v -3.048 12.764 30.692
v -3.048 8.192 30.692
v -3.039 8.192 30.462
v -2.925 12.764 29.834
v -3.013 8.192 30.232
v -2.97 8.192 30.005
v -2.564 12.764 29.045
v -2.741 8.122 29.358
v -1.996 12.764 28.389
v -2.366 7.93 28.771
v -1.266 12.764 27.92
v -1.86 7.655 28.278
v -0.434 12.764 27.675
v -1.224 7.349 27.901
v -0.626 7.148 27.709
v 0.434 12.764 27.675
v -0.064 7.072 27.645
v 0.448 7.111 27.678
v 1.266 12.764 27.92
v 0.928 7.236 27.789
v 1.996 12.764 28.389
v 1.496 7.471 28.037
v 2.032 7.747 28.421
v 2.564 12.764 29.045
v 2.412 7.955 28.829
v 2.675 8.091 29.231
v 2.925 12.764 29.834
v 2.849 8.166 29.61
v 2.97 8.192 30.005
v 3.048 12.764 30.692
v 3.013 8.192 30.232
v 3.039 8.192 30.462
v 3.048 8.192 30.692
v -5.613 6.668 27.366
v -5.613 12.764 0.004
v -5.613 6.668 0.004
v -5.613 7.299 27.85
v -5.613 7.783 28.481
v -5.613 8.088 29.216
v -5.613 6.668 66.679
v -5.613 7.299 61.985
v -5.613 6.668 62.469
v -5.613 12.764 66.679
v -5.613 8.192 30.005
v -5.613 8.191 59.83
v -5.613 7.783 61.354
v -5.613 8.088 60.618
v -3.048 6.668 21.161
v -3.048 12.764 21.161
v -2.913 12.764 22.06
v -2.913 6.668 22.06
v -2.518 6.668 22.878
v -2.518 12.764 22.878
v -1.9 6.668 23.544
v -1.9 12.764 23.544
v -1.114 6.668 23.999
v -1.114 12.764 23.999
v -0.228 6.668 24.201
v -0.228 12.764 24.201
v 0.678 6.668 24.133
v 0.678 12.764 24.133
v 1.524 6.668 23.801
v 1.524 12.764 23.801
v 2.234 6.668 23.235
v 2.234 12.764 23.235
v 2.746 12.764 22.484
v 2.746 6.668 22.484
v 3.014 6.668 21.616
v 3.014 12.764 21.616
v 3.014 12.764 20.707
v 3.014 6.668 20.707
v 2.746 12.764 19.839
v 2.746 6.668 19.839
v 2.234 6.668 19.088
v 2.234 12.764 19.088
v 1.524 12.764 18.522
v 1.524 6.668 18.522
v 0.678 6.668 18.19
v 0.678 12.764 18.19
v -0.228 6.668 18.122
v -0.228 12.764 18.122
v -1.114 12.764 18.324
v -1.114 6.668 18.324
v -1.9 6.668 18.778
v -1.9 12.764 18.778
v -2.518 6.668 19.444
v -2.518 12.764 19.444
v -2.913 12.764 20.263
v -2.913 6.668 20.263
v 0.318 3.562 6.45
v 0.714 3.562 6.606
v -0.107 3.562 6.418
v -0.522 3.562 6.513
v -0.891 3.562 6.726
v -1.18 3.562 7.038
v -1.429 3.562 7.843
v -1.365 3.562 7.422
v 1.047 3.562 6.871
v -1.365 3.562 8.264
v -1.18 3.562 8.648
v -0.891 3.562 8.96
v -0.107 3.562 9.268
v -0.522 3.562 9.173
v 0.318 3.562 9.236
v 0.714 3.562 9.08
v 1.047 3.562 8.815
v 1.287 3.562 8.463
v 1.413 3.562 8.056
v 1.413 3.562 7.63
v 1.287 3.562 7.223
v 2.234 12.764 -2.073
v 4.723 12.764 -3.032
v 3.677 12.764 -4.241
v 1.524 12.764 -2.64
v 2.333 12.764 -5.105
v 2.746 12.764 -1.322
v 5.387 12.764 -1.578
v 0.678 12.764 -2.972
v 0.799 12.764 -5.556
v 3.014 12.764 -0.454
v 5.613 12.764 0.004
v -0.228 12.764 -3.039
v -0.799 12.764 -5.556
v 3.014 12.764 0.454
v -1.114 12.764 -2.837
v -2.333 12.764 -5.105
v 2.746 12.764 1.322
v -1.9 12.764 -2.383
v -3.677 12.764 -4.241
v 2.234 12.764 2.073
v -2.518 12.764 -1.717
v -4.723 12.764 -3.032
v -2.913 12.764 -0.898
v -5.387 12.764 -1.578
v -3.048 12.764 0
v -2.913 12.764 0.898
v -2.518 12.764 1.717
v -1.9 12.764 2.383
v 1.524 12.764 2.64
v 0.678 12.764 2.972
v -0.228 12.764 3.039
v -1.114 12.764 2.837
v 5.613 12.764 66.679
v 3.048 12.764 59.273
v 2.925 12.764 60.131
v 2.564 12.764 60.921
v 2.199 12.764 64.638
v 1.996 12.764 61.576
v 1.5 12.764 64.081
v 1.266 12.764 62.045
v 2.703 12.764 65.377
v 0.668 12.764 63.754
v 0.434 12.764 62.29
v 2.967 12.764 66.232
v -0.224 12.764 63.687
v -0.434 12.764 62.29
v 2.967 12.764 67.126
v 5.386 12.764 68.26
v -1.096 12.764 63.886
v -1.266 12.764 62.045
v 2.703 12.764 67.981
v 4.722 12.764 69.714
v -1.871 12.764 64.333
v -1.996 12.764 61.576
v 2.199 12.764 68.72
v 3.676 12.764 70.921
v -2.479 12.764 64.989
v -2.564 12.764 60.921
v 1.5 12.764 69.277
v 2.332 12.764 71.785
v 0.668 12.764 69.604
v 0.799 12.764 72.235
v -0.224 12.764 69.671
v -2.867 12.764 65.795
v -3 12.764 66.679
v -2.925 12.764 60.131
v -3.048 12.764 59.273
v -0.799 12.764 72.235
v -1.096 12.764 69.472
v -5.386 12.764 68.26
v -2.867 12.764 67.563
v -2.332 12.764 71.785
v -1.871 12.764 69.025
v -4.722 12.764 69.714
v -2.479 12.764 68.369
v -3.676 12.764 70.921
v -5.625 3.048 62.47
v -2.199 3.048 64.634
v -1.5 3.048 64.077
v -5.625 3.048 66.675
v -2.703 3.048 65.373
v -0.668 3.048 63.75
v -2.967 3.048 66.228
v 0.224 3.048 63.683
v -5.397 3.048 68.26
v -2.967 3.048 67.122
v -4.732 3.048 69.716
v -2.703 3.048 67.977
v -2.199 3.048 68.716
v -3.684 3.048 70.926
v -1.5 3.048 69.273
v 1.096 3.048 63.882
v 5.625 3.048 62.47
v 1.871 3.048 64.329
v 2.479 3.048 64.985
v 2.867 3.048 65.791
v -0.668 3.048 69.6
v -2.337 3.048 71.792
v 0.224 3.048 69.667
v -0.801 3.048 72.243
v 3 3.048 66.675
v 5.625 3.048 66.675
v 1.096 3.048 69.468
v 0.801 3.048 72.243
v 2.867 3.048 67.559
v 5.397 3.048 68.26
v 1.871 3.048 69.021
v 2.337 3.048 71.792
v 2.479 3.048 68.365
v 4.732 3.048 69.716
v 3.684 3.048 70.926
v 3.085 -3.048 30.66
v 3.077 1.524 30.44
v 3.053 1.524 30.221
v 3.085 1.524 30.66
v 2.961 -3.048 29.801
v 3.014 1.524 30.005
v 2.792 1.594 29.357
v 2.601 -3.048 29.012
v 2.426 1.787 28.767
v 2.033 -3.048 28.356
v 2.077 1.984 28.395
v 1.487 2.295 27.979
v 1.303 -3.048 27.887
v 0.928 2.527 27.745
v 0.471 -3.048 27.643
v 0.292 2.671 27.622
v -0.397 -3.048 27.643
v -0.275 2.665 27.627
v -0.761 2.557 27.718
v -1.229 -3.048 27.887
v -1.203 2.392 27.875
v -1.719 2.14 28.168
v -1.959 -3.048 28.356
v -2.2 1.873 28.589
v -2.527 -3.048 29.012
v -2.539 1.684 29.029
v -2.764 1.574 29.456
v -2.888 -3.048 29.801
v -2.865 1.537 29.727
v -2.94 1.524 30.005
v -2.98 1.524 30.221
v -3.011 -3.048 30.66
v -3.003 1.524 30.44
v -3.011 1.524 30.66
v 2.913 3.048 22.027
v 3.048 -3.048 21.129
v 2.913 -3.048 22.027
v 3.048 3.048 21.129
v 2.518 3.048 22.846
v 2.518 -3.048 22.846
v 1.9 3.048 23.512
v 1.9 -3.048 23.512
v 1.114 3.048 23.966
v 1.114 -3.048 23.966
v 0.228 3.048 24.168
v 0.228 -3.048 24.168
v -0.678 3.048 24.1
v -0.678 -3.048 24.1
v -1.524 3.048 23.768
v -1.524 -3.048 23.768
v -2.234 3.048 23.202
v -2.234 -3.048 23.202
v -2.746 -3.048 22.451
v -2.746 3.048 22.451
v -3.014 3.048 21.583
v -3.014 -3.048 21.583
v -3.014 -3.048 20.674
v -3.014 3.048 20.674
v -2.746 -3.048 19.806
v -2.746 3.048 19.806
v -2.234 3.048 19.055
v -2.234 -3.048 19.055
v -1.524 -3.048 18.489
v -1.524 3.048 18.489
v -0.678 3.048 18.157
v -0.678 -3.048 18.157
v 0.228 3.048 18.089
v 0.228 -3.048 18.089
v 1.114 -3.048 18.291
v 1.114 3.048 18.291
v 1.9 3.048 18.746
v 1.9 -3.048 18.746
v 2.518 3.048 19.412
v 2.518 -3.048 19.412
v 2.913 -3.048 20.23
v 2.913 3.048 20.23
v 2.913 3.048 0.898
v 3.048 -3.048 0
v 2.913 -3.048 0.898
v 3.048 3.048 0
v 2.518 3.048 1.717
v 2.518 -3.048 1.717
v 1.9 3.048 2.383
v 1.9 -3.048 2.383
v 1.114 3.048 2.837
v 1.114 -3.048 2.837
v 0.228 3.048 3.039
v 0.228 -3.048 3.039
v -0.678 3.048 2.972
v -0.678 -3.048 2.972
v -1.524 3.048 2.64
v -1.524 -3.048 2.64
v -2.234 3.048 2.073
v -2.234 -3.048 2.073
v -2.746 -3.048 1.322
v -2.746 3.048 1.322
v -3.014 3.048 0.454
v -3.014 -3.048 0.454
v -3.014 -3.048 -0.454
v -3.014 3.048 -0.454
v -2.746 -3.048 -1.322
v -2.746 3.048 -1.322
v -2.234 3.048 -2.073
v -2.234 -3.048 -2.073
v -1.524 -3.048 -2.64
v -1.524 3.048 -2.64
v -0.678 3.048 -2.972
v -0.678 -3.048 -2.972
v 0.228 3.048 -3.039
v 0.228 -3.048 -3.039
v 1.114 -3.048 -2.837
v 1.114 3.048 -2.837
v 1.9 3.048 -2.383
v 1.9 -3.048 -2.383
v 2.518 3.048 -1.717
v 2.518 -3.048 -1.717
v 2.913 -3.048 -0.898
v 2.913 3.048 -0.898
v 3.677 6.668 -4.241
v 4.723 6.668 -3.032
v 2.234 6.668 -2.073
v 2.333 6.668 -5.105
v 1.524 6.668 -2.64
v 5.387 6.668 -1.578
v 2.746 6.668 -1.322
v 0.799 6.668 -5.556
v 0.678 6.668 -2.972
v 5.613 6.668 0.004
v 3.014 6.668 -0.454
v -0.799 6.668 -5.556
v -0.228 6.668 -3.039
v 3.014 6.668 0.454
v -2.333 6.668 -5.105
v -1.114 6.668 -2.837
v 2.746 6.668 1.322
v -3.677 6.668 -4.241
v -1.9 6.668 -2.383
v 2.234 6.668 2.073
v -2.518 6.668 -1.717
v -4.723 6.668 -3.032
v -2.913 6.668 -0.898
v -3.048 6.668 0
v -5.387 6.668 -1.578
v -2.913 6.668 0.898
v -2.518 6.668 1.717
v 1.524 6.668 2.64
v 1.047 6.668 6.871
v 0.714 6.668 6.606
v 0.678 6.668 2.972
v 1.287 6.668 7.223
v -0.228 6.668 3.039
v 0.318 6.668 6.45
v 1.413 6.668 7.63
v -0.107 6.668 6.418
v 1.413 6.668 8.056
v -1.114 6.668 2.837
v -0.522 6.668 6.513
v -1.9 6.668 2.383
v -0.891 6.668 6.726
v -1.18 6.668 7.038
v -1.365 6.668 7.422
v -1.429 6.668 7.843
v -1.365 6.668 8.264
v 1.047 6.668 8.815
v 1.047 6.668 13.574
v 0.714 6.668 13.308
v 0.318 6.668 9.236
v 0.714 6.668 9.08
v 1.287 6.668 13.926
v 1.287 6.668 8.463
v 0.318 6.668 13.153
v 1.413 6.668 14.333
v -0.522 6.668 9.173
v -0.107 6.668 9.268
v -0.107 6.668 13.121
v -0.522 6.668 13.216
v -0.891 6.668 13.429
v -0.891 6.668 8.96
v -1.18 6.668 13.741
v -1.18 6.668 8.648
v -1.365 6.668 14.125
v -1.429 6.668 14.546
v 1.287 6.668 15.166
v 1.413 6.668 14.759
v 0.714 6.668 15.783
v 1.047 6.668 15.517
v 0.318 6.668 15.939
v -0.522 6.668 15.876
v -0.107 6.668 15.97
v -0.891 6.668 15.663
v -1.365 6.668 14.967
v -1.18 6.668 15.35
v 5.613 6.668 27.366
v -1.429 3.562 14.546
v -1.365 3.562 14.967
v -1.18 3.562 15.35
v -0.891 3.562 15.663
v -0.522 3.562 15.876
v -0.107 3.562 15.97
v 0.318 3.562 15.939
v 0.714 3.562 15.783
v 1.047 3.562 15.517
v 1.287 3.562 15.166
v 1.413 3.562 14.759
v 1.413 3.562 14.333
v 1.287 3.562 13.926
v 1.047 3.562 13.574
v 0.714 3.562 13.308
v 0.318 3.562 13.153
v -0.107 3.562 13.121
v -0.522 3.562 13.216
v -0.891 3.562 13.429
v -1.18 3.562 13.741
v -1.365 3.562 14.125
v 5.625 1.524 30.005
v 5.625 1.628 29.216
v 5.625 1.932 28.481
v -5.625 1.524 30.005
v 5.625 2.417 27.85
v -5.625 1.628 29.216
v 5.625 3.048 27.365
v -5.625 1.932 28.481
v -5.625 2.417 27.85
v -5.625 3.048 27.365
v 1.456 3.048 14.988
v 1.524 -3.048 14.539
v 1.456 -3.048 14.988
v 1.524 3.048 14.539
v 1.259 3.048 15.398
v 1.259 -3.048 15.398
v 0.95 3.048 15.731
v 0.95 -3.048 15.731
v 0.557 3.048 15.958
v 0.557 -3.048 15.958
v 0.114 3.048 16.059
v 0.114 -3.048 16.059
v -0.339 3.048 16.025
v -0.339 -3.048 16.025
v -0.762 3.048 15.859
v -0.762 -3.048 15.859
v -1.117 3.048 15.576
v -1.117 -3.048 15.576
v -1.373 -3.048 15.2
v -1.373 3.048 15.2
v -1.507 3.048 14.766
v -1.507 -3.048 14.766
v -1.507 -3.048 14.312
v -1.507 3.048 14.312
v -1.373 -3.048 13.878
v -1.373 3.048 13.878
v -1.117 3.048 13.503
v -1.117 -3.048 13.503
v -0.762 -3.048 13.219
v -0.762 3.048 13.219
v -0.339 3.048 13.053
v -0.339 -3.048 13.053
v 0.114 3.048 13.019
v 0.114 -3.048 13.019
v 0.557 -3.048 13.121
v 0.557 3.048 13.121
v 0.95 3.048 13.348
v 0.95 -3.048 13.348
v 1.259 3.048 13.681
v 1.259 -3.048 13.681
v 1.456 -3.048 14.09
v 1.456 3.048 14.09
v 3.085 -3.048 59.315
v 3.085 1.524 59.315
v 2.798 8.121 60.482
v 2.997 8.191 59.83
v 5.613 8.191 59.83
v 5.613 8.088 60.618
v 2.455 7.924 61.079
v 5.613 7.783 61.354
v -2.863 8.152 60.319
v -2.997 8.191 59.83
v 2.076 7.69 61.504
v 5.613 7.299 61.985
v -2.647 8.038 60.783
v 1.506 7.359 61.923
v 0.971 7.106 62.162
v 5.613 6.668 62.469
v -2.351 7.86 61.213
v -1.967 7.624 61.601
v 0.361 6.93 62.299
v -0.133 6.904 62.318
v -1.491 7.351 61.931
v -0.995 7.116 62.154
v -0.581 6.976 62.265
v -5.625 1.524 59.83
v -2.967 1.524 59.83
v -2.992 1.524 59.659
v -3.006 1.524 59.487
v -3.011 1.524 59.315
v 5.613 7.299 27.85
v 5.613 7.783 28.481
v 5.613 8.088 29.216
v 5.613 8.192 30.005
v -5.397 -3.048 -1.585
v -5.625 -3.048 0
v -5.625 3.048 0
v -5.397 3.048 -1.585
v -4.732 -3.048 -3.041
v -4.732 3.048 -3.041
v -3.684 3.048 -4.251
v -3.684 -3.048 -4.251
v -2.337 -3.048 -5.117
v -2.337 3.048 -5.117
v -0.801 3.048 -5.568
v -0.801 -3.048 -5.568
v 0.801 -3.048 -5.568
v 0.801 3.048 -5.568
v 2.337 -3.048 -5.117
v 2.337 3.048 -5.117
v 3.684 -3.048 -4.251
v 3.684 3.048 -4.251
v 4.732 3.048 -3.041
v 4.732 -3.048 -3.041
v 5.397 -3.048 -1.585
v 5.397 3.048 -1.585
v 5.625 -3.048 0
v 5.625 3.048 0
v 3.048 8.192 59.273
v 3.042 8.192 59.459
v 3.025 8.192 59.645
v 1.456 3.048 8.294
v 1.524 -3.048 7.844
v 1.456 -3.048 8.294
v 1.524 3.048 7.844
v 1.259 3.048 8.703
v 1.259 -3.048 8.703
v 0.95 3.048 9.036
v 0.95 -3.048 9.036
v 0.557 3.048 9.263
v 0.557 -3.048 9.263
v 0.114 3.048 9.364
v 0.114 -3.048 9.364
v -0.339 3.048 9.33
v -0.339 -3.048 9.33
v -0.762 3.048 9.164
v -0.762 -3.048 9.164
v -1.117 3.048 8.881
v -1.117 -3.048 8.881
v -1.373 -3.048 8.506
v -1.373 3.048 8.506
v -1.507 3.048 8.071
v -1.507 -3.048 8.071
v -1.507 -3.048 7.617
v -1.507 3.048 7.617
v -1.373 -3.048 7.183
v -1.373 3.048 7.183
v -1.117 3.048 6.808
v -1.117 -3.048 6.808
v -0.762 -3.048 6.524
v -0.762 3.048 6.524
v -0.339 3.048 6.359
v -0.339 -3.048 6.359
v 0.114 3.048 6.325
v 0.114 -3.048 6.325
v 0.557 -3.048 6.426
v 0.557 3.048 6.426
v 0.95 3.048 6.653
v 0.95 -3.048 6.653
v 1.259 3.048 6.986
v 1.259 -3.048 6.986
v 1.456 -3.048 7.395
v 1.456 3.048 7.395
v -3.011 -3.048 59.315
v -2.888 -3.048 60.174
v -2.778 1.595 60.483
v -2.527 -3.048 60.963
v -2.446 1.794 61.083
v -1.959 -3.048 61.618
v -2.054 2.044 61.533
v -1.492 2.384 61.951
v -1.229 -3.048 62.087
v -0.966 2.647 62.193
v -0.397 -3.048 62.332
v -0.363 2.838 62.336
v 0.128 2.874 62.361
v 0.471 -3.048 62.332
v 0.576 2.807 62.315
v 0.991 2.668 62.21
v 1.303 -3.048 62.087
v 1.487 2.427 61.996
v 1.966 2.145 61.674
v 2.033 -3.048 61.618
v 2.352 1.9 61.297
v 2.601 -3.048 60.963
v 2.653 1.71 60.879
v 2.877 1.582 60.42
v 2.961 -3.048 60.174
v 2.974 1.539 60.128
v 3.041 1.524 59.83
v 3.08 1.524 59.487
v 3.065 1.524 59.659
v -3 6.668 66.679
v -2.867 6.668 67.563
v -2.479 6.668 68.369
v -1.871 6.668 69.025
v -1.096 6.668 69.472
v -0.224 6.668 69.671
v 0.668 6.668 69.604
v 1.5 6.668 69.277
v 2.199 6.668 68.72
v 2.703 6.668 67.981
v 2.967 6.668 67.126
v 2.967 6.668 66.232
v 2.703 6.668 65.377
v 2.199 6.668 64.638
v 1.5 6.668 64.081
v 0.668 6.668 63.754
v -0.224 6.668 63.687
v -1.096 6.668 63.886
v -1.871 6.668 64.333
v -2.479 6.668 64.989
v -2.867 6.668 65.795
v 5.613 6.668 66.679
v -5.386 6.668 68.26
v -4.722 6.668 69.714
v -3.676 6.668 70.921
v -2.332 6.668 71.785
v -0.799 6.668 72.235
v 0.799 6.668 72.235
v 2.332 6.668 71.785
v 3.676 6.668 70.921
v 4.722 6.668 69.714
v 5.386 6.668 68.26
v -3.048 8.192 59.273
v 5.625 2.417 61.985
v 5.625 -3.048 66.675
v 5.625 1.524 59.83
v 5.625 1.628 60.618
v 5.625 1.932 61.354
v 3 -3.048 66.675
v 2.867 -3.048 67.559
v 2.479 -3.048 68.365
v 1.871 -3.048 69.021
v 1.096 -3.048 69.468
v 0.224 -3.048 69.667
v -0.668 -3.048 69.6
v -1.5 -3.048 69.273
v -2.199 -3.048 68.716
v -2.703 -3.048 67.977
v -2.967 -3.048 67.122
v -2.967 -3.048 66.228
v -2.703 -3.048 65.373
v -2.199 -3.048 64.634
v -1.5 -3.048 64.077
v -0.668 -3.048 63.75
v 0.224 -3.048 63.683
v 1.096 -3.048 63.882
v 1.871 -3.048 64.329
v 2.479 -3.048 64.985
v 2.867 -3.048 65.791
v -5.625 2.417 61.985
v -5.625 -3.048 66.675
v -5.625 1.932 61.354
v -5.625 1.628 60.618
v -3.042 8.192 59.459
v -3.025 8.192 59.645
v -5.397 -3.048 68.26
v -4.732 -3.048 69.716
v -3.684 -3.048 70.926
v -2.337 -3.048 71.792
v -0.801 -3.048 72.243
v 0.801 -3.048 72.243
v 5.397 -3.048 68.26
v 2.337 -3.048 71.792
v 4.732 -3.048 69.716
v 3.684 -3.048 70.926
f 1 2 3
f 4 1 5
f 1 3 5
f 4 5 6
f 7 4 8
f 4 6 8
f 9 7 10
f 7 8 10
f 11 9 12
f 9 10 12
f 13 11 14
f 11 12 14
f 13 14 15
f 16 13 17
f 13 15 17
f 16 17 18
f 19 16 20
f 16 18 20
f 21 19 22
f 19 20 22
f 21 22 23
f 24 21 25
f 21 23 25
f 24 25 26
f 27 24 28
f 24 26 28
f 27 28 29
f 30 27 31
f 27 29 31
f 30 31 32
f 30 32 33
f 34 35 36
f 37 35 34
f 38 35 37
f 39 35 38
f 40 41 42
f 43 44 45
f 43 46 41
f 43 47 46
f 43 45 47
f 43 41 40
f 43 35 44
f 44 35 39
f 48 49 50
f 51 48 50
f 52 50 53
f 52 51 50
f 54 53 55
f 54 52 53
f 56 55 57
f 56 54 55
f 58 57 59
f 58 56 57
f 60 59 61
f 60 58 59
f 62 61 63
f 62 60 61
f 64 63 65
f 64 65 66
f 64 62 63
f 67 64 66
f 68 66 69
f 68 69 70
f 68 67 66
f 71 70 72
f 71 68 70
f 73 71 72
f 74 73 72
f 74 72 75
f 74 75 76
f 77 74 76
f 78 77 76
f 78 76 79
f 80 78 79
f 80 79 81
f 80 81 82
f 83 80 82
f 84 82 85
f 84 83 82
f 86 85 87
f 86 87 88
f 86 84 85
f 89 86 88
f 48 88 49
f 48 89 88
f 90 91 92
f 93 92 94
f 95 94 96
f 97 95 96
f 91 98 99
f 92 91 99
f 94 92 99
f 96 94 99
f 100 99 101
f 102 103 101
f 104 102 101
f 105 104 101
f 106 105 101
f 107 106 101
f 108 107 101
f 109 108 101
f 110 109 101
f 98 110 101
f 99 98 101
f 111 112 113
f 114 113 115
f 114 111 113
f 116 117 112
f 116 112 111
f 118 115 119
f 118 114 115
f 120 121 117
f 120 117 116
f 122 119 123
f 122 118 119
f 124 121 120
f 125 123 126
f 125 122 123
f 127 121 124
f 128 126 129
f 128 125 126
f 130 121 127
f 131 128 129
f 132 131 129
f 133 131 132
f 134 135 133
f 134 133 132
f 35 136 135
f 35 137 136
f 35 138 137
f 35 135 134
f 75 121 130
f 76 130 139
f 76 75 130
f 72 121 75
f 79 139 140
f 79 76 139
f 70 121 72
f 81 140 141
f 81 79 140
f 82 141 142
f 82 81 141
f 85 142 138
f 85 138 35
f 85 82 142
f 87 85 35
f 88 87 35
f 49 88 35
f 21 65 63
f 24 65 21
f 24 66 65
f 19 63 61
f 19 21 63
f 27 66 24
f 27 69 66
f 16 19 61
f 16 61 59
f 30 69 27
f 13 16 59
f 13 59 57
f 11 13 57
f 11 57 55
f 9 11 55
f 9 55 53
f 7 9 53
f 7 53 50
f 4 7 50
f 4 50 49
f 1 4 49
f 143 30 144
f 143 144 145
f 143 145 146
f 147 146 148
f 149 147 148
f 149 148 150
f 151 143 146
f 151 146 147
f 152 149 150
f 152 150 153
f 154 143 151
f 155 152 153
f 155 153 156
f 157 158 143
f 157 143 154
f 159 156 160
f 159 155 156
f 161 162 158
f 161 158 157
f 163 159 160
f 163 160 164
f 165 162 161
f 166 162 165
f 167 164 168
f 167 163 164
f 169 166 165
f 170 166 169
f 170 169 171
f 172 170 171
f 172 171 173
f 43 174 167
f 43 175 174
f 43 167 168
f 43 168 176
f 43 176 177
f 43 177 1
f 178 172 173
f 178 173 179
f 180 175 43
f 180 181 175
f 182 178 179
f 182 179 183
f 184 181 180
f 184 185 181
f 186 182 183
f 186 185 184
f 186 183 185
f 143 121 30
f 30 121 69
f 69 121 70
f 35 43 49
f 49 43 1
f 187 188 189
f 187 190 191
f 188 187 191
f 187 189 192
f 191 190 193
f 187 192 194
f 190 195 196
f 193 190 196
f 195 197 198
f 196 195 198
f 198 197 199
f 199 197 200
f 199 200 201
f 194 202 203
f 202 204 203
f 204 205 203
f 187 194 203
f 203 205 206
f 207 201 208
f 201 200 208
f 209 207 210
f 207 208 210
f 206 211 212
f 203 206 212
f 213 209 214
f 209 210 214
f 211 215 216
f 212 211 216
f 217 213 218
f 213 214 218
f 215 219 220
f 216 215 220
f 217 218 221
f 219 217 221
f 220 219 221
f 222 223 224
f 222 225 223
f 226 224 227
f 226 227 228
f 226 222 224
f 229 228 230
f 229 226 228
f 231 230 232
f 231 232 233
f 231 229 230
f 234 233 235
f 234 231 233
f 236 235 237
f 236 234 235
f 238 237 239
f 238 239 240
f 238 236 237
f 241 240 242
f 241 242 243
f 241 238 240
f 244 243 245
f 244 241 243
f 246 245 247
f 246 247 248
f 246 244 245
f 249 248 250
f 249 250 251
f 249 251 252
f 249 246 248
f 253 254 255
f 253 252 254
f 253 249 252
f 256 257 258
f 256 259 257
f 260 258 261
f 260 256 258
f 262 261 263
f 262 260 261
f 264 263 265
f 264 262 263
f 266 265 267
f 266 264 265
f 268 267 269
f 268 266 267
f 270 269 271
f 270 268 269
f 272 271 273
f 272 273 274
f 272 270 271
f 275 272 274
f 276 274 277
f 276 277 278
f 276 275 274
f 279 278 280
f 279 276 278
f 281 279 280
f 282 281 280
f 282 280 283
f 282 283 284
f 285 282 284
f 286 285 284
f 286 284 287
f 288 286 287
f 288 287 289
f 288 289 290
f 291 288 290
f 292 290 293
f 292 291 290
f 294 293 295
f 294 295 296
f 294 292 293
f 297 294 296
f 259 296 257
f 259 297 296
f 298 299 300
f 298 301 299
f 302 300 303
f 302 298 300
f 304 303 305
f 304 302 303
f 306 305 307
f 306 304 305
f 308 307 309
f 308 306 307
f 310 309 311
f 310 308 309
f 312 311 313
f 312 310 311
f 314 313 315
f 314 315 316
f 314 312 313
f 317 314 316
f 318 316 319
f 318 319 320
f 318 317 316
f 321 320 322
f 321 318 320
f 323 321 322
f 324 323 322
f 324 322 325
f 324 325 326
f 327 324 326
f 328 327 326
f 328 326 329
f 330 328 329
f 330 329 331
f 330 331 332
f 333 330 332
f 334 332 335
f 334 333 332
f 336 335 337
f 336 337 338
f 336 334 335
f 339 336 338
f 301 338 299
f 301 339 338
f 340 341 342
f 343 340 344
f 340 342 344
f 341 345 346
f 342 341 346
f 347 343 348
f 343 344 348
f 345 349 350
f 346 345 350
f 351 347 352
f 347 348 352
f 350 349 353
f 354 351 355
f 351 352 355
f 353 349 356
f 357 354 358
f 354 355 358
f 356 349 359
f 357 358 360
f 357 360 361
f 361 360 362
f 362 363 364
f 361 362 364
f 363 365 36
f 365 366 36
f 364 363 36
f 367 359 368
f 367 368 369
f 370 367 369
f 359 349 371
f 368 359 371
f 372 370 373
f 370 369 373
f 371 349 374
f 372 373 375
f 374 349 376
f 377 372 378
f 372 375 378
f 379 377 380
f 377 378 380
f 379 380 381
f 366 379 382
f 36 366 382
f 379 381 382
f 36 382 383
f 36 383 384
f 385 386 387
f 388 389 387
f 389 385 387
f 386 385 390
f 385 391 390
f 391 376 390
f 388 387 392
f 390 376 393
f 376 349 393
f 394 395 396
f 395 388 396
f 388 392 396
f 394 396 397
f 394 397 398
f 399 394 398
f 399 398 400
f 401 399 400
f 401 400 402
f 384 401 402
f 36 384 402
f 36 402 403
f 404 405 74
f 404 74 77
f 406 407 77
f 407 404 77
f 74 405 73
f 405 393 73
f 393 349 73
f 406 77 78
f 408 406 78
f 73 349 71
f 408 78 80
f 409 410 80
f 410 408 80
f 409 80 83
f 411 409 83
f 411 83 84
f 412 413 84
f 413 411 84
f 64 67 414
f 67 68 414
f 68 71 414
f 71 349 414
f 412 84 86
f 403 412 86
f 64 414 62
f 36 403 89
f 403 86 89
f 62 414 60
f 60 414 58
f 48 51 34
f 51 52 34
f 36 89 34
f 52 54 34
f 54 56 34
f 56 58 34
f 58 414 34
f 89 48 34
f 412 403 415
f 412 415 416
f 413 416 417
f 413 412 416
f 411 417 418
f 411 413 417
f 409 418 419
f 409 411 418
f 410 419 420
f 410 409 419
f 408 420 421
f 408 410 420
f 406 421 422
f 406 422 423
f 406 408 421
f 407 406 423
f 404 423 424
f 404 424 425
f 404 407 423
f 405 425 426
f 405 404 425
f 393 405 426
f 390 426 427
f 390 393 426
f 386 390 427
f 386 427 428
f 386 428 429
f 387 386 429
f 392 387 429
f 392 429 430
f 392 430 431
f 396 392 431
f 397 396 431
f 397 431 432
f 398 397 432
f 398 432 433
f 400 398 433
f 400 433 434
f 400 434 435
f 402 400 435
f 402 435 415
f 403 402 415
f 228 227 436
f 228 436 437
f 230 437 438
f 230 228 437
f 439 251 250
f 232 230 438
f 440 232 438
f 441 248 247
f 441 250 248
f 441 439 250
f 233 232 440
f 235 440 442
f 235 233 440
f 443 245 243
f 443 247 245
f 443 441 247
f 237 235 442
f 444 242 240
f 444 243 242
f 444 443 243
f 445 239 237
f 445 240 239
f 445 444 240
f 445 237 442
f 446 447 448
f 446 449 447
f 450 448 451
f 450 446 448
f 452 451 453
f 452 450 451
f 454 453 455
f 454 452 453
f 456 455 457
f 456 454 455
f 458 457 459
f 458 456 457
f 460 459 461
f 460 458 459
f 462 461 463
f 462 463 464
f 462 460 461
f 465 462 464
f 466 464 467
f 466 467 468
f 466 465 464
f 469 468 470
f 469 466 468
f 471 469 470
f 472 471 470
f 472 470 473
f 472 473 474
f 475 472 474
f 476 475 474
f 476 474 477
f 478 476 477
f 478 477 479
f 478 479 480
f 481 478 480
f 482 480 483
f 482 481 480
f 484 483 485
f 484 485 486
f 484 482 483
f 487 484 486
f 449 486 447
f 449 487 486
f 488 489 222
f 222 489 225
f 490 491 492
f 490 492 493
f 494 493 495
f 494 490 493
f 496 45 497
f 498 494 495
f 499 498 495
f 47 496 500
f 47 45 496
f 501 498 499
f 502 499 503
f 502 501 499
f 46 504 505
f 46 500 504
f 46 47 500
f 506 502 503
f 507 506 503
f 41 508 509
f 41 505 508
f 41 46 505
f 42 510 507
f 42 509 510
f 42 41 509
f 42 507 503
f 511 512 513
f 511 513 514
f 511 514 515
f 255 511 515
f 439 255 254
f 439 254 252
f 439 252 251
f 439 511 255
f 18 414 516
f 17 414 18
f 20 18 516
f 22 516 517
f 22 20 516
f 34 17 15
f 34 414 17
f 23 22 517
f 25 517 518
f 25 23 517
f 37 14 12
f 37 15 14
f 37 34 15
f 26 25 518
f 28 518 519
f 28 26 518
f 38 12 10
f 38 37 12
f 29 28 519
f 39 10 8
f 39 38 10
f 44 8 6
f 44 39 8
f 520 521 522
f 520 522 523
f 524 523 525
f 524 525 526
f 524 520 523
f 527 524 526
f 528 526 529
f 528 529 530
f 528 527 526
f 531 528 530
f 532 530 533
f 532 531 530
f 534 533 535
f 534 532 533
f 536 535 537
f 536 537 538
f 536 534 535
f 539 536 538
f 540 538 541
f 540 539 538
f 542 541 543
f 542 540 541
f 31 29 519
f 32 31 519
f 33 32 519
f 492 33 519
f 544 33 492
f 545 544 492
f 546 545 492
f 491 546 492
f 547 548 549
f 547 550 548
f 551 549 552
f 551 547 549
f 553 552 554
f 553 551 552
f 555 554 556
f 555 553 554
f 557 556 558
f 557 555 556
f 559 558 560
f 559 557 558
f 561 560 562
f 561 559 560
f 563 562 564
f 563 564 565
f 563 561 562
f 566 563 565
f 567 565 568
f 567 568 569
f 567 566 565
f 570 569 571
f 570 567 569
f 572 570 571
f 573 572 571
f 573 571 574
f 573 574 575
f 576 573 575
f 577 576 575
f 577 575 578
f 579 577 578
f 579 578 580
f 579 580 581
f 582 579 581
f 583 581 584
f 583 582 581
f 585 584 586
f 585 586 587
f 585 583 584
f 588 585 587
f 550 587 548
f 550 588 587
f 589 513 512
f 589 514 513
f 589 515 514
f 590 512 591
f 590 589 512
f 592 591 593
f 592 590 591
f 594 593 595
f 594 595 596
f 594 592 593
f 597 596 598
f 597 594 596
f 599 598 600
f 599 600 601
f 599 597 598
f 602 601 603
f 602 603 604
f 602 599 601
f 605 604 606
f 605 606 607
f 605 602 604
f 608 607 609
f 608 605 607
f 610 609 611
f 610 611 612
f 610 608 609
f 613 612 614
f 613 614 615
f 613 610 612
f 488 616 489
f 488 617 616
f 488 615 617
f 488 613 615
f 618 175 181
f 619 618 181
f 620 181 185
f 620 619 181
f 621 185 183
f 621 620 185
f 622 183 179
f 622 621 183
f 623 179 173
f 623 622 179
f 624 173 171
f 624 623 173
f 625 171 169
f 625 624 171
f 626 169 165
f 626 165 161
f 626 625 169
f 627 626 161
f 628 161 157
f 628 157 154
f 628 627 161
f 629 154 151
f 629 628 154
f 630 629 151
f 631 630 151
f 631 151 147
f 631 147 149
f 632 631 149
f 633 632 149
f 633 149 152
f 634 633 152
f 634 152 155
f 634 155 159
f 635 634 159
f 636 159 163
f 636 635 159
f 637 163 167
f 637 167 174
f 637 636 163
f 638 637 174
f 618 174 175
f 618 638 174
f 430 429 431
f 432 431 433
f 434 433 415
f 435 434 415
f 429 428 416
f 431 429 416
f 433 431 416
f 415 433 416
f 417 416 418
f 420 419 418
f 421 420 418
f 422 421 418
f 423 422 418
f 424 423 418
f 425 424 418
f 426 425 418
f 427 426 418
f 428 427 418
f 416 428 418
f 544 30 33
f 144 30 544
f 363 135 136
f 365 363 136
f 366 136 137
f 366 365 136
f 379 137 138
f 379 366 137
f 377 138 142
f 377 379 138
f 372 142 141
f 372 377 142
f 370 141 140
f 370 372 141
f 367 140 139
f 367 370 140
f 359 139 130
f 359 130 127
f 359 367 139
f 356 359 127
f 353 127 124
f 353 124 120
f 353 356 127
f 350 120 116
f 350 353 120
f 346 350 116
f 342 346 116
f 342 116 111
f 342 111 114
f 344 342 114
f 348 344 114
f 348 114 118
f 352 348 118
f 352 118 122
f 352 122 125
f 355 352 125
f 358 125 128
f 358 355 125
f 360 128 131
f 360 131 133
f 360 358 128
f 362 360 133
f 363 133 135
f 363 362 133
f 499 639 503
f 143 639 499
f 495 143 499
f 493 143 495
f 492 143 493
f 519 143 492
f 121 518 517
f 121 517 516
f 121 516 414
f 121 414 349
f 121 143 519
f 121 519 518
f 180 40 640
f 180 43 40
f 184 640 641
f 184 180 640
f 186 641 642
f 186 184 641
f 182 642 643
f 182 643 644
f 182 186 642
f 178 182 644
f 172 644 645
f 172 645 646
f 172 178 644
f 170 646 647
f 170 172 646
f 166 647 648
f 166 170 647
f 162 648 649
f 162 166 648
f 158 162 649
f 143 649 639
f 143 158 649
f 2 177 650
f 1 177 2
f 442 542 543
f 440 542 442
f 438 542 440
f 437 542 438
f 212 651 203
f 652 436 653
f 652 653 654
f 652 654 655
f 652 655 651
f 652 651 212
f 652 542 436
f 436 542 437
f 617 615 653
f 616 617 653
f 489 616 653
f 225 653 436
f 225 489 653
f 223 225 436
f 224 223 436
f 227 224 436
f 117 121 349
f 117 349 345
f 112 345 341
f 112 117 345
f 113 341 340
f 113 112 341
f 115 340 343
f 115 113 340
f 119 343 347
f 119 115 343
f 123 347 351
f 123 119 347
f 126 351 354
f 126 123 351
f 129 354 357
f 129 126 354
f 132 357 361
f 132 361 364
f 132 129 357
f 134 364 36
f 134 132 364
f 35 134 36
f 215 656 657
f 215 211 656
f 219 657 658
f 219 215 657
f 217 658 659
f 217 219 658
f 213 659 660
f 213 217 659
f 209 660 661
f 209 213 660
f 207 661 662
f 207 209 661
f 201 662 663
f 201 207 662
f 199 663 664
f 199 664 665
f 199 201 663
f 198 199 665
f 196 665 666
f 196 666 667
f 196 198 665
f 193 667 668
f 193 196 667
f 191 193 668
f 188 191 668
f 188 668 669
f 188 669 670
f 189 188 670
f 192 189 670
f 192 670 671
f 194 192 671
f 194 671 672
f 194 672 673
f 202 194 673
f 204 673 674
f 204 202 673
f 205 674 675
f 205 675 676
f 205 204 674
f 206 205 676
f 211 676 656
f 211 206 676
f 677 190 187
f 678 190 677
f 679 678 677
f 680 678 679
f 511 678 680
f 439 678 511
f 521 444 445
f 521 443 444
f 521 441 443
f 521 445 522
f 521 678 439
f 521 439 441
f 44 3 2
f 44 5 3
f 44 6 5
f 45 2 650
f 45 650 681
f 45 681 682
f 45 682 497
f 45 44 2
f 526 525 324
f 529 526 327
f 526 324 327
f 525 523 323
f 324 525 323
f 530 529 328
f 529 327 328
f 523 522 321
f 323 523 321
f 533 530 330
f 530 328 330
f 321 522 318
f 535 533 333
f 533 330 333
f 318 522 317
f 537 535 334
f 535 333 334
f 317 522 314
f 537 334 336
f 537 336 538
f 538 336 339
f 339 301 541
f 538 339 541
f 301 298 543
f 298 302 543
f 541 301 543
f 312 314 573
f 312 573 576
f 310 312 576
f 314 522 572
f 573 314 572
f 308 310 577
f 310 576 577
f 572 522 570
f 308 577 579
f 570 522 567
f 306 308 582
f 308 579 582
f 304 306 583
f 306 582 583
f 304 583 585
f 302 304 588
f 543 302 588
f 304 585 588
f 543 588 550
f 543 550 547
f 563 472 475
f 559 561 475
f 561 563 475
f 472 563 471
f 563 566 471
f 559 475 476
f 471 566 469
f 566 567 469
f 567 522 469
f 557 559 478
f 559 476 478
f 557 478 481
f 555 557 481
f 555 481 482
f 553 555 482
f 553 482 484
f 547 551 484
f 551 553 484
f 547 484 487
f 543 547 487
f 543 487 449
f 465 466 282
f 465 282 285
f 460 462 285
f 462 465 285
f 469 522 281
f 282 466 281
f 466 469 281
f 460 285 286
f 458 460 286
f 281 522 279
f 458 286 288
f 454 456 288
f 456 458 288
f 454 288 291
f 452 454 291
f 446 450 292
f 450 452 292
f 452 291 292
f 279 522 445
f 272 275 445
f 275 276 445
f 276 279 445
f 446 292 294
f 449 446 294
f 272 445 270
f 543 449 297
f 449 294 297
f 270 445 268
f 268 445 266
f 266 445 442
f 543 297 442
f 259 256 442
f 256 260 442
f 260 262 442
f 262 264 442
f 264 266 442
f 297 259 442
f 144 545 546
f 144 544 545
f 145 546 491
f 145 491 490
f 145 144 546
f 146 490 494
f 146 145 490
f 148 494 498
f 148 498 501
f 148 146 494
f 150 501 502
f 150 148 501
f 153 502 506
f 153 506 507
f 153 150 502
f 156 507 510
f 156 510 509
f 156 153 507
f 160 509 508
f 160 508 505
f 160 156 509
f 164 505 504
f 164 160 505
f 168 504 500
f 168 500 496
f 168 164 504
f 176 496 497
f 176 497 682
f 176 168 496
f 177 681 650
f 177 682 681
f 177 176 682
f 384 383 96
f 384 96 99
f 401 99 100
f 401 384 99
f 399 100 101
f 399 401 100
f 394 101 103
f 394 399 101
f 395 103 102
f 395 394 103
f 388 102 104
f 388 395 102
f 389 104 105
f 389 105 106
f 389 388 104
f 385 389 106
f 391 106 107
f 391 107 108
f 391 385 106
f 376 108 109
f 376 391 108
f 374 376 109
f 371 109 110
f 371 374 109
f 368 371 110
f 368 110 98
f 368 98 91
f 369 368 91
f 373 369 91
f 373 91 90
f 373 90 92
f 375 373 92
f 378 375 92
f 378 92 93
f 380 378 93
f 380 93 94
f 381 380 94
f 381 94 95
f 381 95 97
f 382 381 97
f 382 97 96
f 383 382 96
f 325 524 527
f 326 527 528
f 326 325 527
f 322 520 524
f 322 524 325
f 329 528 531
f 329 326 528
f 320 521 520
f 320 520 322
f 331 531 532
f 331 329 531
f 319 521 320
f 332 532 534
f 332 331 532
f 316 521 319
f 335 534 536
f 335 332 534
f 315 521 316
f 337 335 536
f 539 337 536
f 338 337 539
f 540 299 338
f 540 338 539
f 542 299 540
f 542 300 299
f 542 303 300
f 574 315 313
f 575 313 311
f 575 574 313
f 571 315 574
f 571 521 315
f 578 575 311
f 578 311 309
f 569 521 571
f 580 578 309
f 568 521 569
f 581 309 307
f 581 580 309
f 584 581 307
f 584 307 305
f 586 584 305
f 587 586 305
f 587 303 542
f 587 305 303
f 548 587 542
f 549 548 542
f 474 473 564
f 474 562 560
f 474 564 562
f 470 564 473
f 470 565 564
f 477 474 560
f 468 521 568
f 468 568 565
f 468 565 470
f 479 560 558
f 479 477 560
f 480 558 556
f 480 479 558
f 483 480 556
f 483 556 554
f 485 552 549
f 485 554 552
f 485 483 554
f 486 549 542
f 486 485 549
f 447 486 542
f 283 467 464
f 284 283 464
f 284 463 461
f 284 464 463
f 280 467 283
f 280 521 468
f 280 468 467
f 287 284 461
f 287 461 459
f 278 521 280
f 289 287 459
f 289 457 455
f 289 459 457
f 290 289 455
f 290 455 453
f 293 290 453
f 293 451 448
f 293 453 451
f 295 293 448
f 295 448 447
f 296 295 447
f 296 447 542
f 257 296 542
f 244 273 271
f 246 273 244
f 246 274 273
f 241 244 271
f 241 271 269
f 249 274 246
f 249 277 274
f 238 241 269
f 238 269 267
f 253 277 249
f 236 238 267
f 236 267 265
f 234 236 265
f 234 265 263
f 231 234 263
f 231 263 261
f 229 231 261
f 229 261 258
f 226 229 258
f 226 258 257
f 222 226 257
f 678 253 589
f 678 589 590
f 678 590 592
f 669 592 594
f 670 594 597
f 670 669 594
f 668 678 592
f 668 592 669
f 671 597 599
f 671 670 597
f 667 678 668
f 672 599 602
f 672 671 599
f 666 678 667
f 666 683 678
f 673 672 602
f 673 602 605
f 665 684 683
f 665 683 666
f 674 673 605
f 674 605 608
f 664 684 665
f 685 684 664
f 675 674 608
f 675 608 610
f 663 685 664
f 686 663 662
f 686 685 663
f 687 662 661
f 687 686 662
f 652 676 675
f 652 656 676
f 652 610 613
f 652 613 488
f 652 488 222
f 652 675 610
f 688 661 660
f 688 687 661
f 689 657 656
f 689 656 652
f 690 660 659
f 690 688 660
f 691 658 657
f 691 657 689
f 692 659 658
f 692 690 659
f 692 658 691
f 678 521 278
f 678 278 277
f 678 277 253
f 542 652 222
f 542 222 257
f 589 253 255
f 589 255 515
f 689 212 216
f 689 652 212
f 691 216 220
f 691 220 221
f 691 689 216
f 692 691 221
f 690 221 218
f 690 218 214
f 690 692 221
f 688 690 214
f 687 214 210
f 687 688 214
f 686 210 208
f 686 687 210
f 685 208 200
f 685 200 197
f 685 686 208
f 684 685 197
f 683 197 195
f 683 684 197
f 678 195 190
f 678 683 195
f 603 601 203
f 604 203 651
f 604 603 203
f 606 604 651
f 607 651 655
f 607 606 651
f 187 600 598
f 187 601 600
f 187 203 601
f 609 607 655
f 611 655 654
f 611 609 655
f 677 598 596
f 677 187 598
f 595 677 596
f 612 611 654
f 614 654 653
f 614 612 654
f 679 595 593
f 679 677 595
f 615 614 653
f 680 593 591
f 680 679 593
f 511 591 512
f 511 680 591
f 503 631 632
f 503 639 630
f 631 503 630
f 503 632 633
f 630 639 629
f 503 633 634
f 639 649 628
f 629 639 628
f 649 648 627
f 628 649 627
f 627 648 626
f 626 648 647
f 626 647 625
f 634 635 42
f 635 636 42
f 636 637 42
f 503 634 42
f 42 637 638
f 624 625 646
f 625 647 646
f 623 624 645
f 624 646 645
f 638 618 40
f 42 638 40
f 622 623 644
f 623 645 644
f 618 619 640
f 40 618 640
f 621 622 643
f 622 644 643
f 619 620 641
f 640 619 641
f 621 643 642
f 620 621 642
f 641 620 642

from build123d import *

# Parameters (mm, degrees)
F0_R      = 0.4064
F0_R_2    = 0.2032
F0_R_3    = 0.40005
F1_DEPTH  = 0.4064
F4_R      = 0.4064
F4_R_2    = 0.1905
F4_R_3    = 0.40005
F6_DEPTH  = 0.4064
F7_DEPTH  = 0.82042
F9_DEPTH  = 12.7
F10_DEPTH = 11.1252
F11_SCALE = 7.5


with BuildPart() as f1:
    # F0 (on Front) → F1 (new body, symmetric)
    with BuildSketch(Plane.XZ):
        with BuildLine():
            ThreePointArc((0.75, 8.89), (0, 9.64), (-0.75, 8.89))
            Line((-0.75, 8.89), (-0.75, 0))
            ThreePointArc((-0.75, 0), (0, -0.75), (0.75, 0))
            Line((0.75, 0), (0.75, 8.89))
        make_face()
        Circle(F0_R, mode=Mode.SUBTRACT)
        with Locations((0, 1.0459080804)):
            Circle(F0_R_2, mode=Mode.SUBTRACT)
        with Locations((0, 1.9385553896)):
            Circle(F0_R_2, mode=Mode.SUBTRACT)
        with Locations((0, 2.8171434533)):
            Circle(F0_R, mode=Mode.SUBTRACT)
        with BuildLine():
            ThreePointArc((-0.4015, 7.9086376354), (0.0049, 8.3150376354), (0.4113, 7.9086376354))
            Line((0.4113, 7.9086376354), (0.4113, 4.0879380144))
            ThreePointArc((0.4113, 4.0879380144), (0.0049, 3.6815380144), (-0.4015, 4.0879380144))
            Line((-0.4015, 4.0879380144), (-0.4015, 7.9086376354))
        make_face(mode=Mode.SUBTRACT)
        with Locations((0, 8.89)):
            Circle(F0_R_3, mode=Mode.SUBTRACT)
    extrude(amount=F1_DEPTH, both=True)

    # F8 (on offset) → F10 (cut)
    with BuildSketch(Plane.YZ.offset(-7.874)):
        with BuildLine():
            ThreePointArc((0.6010708166, 8.3836700556), (0.3192267269, 8.2616387189), (0.2032, 7.9772700556))
            Line((0.2032, 7.9772700556), (0.2032, 4.0006997783))
            ThreePointArc((0.2032, 4.0006997783), (0.3192267269, 3.716331115), (0.6010708166, 3.5942997783))
            Line((0.6010708166, 3.5942997783), (0.6010708166, 8.3836700556))
        make_face()
    extrude(amount=F10_DEPTH, mode=Mode.SUBTRACT)


with BuildPart() as f6:
    # F4 (on offset) → F6 (new body, symmetric)
    with BuildSketch(Plane(origin=(0, 1.2954, 0), x_dir=(-1, 0, 0), z_dir=(0, 1, 0))):
        with BuildLine():
            ThreePointArc((0.7483907909, 8.8905394077), (0, 9.6389301985), (-0.7483907909, 8.8905394077))
            Line((-0.7483907909, 8.8905394077), (-0.7483907909, 0.0005394077))
            ThreePointArc((-0.7483907909, 0.0005394077), (0, -0.7483909852), (0.7483907909, 0.0005394077))
            Line((0.7483907909, 0.0005394077), (0.7483907909, 8.8905394077))
        make_face()
        Circle(F4_R, mode=Mode.SUBTRACT)
        with Locations((0, 1.0457308963)):
            Circle(F4_R_2, mode=Mode.SUBTRACT)
        with Locations((0, 1.9394207047)):
            Circle(F4_R_2, mode=Mode.SUBTRACT)
        with Locations((0, 2.8215172576)):
            Circle(F4_R, mode=Mode.SUBTRACT)
        with BuildLine():
            ThreePointArc((-0.4064, 7.9030329362), (0, 8.3094329362), (0.4064, 7.9030329362))
            Line((0.4064, 7.9030329362), (0.4064, 4.0923212655))
            ThreePointArc((0.4064, 4.0923212655), (0, 3.6859212655), (-0.4064, 4.0923212655))
            Line((-0.4064, 4.0923212655), (-0.4064, 7.9030329362))
        make_face(mode=Mode.SUBTRACT)
        with Locations((0, 8.8905394077)):
            Circle(F4_R_3, mode=Mode.SUBTRACT)
        with Locations((0, 1.0457308963)):
            Circle(F4_R_2)
        with Locations((0, 1.9394207047)):
            Circle(F4_R_2)
    extrude(amount=F6_DEPTH, both=True)

    # F4 (on offset) → F7 (join)
    with BuildSketch(Plane(origin=(0, 1.2954, 0), x_dir=(-1, 0, 0), z_dir=(0, 1, 0))):
        with Locations((0, 1.0457308963)):
            Circle(F4_R_2)
        with Locations((0, 1.9394207047)):
            Circle(F4_R_2)
    extrude(amount=-F7_DEPTH)

    # F8 (on offset) → F9 (cut)
    with BuildSketch(Plane.YZ.offset(-7.874)):
        with BuildLine():
            Line((1.0922, 4.0006997783), (1.0922, 7.9772700556))
            ThreePointArc((1.0922, 7.9772700556), (0.9744198888, 8.2633875048), (0.689345412, 8.3836700556))
            Line((0.689345412, 8.3836700556), (0.689345412, 3.5942997783))
            ThreePointArc((0.689345412, 3.5942997783), (0.9744198888, 3.7145823291), (1.0922, 4.0006997783))
        make_face()
    extrude(amount=F9_DEPTH, mode=Mode.SUBTRACT)


with BuildPart() as f1_1:
    # F11: moved
    add(f1.part.scale(F11_SCALE))


with BuildPart() as f6_1:
    # F11: moved
    add(f6.part.scale(F11_SCALE))


solid = Compound([f1_1.part, f6_1.part])
